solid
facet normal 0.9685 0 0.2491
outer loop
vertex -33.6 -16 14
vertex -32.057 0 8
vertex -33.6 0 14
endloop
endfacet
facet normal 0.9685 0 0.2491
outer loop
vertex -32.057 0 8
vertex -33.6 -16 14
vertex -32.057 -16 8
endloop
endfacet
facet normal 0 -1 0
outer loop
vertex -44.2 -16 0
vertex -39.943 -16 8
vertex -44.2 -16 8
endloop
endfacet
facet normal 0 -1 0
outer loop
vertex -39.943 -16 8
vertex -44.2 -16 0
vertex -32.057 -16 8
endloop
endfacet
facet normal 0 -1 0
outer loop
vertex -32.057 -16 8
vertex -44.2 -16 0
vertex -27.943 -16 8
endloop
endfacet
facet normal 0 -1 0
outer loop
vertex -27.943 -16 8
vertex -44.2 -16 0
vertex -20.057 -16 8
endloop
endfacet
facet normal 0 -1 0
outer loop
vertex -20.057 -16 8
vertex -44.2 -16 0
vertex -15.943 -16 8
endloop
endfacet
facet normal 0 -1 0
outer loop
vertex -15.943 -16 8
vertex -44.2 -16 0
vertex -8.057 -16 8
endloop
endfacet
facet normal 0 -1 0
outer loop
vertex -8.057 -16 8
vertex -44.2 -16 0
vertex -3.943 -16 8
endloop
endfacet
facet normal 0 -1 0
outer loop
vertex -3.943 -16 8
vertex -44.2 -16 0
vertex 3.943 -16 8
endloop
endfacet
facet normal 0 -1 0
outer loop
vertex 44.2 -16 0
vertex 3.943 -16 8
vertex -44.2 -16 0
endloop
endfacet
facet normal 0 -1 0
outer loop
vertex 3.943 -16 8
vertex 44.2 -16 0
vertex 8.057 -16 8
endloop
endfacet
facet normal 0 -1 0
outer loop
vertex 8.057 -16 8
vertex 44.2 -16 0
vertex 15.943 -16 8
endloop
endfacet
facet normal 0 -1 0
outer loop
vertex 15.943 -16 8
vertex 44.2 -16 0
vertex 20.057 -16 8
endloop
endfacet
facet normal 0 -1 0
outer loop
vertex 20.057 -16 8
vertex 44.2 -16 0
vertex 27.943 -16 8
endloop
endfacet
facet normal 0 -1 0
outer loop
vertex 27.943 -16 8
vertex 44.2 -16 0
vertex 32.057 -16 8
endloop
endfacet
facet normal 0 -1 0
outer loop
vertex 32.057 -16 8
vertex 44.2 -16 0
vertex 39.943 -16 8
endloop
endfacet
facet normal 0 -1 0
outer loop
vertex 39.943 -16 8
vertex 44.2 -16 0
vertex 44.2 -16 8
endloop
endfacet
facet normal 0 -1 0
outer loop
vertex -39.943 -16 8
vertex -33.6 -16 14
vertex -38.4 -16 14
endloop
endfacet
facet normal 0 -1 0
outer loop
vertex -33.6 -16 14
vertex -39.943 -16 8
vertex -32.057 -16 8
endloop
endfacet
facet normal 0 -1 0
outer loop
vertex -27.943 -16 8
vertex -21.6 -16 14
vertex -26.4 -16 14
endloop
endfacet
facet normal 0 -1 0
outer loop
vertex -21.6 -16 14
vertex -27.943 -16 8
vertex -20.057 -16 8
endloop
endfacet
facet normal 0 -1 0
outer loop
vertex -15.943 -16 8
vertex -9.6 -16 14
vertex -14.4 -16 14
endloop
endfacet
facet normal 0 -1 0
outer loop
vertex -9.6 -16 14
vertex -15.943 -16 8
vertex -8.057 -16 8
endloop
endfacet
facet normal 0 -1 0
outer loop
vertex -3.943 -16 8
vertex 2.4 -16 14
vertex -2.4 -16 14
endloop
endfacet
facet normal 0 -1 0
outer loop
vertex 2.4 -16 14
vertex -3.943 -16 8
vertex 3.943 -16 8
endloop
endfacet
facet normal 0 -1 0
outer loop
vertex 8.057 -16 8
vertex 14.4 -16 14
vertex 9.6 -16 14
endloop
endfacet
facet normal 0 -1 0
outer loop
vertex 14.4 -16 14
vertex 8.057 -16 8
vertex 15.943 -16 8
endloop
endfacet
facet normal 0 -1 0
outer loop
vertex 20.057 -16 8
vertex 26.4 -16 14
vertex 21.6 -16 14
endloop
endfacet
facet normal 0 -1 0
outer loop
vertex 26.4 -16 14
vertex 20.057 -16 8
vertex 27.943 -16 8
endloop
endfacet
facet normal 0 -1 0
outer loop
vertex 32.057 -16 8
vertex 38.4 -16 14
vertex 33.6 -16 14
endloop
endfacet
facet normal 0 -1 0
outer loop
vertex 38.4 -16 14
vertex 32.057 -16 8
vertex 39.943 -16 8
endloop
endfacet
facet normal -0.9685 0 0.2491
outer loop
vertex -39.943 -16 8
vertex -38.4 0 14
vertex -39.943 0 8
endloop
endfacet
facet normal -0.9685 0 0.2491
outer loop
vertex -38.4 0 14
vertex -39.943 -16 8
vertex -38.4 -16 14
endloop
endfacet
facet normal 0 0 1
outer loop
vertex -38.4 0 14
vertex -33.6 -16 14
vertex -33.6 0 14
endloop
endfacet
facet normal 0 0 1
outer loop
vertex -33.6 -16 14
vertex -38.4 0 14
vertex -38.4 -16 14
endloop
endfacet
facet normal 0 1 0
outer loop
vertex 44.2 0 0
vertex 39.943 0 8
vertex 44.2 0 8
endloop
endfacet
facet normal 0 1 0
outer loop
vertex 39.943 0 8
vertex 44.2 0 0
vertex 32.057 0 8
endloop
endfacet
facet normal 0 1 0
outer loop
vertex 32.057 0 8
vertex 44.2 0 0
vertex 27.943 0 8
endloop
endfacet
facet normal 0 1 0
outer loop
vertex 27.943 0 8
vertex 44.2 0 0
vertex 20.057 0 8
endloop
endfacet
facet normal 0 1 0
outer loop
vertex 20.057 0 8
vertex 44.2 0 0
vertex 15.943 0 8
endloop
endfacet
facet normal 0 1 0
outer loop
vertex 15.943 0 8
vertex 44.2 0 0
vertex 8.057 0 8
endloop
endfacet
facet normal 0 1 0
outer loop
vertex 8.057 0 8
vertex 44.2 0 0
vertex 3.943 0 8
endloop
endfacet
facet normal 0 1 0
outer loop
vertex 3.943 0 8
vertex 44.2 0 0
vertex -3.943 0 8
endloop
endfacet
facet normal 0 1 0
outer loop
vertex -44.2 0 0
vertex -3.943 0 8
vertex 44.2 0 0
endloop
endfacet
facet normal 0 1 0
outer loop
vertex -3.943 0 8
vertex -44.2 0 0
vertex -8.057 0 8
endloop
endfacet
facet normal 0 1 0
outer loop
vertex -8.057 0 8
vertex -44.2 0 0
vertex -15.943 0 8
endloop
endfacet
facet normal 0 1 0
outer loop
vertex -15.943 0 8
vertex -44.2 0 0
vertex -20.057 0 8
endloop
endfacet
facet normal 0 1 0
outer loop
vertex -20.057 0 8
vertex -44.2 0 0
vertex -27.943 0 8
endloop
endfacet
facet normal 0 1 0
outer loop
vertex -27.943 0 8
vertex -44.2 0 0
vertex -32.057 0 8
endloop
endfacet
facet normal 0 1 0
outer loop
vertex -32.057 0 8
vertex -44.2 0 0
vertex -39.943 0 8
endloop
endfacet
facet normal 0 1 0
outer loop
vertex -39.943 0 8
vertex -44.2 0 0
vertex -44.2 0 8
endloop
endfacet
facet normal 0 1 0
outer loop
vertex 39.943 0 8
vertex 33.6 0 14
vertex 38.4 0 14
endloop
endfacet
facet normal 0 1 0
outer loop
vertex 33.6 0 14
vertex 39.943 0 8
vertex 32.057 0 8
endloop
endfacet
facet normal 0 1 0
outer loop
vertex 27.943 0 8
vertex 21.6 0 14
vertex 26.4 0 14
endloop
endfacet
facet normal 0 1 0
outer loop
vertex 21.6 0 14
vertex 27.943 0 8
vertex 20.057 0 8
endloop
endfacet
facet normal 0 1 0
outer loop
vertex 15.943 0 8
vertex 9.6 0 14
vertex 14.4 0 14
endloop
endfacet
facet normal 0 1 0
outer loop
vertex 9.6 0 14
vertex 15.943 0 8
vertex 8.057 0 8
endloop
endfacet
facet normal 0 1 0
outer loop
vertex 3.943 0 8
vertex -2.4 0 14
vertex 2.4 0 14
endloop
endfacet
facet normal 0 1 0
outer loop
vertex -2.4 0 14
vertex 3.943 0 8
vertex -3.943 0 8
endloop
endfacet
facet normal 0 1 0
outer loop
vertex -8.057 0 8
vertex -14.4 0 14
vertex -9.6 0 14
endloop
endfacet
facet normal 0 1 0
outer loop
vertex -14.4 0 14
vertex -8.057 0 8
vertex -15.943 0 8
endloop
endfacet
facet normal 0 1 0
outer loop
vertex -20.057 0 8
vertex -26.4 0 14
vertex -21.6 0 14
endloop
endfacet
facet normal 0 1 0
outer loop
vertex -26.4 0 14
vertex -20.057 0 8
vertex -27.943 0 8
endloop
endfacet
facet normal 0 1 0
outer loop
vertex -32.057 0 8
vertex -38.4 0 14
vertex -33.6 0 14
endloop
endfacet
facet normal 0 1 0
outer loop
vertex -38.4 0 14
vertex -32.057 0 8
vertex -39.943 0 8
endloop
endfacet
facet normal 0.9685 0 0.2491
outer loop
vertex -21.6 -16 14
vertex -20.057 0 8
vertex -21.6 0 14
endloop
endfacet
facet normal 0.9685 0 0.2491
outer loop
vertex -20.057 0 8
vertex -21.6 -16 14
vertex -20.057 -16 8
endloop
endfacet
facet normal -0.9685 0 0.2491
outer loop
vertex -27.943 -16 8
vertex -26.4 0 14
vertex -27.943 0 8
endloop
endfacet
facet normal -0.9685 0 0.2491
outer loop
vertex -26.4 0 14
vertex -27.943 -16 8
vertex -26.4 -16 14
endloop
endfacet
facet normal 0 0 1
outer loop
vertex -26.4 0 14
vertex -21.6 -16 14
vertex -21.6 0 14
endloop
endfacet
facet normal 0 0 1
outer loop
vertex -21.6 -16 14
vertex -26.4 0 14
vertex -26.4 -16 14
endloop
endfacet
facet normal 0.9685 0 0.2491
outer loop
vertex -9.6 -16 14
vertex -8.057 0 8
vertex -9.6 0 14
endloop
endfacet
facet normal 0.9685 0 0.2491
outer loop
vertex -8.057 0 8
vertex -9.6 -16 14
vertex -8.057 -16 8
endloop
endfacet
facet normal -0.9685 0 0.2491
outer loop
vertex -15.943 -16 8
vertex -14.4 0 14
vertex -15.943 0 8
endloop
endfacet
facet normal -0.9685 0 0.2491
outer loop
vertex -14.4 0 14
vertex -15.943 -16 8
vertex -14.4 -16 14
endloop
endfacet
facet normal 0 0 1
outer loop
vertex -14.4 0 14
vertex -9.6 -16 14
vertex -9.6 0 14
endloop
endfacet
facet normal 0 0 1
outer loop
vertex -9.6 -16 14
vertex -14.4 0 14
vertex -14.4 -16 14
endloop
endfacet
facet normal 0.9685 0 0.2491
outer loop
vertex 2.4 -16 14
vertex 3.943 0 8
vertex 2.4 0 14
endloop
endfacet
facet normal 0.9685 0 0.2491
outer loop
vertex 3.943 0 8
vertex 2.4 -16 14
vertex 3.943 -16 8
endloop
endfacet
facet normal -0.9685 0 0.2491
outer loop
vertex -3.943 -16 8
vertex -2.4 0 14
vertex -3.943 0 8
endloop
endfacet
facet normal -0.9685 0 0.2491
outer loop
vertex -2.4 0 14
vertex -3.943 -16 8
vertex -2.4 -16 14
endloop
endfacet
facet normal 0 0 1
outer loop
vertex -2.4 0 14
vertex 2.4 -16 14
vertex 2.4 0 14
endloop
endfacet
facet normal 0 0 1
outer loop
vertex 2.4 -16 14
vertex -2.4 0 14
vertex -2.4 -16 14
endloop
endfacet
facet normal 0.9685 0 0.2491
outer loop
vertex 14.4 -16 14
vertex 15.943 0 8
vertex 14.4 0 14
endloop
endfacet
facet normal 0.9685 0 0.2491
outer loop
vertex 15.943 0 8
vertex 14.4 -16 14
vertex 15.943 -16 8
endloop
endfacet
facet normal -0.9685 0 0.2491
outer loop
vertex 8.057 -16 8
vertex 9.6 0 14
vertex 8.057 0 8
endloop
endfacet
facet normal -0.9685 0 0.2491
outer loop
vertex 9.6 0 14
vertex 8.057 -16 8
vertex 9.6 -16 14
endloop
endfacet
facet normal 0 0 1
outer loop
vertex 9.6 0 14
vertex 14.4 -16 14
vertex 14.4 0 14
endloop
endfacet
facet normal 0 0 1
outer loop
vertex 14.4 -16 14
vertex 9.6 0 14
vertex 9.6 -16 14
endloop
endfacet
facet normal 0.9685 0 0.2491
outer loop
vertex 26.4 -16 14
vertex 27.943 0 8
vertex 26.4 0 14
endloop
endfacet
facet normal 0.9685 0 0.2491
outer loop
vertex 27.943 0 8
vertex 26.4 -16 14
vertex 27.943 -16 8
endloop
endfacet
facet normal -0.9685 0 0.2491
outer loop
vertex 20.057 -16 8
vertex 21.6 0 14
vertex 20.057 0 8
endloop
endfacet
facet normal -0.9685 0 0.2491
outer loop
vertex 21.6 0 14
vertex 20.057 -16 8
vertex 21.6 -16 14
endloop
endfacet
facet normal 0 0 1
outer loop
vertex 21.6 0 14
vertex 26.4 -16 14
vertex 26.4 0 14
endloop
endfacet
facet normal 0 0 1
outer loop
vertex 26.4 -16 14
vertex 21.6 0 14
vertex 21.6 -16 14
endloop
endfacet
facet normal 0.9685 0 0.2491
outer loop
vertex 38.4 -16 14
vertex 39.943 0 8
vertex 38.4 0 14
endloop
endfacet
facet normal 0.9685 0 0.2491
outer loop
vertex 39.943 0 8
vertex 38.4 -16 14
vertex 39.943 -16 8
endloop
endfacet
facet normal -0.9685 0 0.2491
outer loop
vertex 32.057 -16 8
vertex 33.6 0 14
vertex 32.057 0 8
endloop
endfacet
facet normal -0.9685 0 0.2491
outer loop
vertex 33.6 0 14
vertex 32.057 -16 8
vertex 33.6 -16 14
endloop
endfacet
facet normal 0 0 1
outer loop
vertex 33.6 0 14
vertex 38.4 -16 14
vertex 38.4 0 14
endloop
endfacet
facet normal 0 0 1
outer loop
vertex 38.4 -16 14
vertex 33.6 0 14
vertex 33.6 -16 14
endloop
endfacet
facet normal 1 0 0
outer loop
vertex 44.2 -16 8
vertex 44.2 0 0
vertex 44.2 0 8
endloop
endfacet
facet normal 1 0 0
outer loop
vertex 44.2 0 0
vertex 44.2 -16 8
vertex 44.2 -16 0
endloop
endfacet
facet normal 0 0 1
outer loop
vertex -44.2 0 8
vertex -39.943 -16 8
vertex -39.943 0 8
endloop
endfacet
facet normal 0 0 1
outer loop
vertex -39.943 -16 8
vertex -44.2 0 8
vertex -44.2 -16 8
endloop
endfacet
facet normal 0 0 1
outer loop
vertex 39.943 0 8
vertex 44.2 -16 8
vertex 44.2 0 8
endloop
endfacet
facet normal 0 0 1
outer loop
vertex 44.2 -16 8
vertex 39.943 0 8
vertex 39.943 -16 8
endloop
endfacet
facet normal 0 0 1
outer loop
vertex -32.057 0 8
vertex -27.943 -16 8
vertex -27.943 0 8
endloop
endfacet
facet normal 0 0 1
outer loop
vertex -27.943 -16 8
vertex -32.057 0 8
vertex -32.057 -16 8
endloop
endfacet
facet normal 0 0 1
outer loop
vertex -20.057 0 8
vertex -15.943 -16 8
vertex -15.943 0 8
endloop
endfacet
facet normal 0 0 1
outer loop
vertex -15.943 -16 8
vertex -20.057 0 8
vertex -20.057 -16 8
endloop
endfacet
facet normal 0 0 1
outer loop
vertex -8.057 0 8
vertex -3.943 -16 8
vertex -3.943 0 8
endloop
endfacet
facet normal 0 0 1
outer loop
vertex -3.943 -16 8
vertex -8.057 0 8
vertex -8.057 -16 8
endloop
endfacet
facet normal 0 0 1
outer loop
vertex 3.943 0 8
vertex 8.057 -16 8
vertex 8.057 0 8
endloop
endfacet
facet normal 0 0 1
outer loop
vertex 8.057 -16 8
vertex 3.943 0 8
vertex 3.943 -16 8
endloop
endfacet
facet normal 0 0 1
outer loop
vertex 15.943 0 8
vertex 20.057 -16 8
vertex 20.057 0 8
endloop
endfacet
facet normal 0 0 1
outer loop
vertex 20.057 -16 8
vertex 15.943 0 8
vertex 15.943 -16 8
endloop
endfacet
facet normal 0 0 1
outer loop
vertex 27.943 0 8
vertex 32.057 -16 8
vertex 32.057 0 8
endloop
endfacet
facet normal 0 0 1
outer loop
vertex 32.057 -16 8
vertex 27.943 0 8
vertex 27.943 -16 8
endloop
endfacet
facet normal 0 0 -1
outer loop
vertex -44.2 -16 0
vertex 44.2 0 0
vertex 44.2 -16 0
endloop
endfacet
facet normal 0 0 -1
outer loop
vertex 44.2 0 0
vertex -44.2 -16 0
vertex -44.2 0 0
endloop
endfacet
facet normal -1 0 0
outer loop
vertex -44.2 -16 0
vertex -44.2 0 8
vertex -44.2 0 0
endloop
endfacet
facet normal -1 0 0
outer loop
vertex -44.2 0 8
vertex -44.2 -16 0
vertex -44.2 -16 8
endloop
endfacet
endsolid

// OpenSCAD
$fn = 32;

// ----------------------------------------------------------------------
// Toothed rack, 7 teeth
// 12 mm pitch, 6 mm teeth
// ----------------------------------------------------------------------

// --- parameters (mm) ---
bar_w = 16;     // bar width (Y)
bar_h = 8;      // bar height (Z)
teeth = 7;      // number of teeth
pitch = 12;     // tooth pitch
tooth_h = 6;    // tooth height above the bar
root_w = 8.4;   // tooth width at the root
crest_w = 4.8;  // tooth width at the crest

// --- derived feature positions (mm) ---
span = (teeth - 1) * pitch;  // = 72   distance between the outer teeth
bar_l = span + root_w + 8;   // = 88.4   bar length: teeth plus 4 mm at each end
tooth_x = -span / 2;         // = -36   X of the first tooth
height = bar_h + tooth_h;    // = 14   overall height
feature_centers = [
  [tooth_x + 0 * pitch, -bar_w / 2],
  [tooth_x + 1 * pitch, -bar_w / 2],
  [tooth_x + 2 * pitch, -bar_w / 2],
  [tooth_x + 3 * pitch, -bar_w / 2],
  [tooth_x + 4 * pitch, -bar_w / 2],
  [tooth_x + 5 * pitch, -bar_w / 2],
  [tooth_x + 6 * pitch, -bar_w / 2]
];   // tooth centre line, drives the tooth loop

// bar with a rack of teeth, one extruded trapezoium per centre
module rack_tooth() {
  linear_extrude(height = bar_w)
    polygon(points = [
      [0, 0],
      [root_w, 0],
      [root_w / 2 + crest_w / 2, tooth_h + 1],
      [root_w / 2 - crest_w / 2, tooth_h + 1]
    ]);
}

union() {
  translate([-bar_l / 2, -bar_w, 0]) cube([bar_l, bar_w, bar_h]);
  for (centre = feature_centers)
    translate([centre[0] - root_w / 2, 0, bar_h - 1]) rotate([90, 0, 0]) rack_tooth();
}
